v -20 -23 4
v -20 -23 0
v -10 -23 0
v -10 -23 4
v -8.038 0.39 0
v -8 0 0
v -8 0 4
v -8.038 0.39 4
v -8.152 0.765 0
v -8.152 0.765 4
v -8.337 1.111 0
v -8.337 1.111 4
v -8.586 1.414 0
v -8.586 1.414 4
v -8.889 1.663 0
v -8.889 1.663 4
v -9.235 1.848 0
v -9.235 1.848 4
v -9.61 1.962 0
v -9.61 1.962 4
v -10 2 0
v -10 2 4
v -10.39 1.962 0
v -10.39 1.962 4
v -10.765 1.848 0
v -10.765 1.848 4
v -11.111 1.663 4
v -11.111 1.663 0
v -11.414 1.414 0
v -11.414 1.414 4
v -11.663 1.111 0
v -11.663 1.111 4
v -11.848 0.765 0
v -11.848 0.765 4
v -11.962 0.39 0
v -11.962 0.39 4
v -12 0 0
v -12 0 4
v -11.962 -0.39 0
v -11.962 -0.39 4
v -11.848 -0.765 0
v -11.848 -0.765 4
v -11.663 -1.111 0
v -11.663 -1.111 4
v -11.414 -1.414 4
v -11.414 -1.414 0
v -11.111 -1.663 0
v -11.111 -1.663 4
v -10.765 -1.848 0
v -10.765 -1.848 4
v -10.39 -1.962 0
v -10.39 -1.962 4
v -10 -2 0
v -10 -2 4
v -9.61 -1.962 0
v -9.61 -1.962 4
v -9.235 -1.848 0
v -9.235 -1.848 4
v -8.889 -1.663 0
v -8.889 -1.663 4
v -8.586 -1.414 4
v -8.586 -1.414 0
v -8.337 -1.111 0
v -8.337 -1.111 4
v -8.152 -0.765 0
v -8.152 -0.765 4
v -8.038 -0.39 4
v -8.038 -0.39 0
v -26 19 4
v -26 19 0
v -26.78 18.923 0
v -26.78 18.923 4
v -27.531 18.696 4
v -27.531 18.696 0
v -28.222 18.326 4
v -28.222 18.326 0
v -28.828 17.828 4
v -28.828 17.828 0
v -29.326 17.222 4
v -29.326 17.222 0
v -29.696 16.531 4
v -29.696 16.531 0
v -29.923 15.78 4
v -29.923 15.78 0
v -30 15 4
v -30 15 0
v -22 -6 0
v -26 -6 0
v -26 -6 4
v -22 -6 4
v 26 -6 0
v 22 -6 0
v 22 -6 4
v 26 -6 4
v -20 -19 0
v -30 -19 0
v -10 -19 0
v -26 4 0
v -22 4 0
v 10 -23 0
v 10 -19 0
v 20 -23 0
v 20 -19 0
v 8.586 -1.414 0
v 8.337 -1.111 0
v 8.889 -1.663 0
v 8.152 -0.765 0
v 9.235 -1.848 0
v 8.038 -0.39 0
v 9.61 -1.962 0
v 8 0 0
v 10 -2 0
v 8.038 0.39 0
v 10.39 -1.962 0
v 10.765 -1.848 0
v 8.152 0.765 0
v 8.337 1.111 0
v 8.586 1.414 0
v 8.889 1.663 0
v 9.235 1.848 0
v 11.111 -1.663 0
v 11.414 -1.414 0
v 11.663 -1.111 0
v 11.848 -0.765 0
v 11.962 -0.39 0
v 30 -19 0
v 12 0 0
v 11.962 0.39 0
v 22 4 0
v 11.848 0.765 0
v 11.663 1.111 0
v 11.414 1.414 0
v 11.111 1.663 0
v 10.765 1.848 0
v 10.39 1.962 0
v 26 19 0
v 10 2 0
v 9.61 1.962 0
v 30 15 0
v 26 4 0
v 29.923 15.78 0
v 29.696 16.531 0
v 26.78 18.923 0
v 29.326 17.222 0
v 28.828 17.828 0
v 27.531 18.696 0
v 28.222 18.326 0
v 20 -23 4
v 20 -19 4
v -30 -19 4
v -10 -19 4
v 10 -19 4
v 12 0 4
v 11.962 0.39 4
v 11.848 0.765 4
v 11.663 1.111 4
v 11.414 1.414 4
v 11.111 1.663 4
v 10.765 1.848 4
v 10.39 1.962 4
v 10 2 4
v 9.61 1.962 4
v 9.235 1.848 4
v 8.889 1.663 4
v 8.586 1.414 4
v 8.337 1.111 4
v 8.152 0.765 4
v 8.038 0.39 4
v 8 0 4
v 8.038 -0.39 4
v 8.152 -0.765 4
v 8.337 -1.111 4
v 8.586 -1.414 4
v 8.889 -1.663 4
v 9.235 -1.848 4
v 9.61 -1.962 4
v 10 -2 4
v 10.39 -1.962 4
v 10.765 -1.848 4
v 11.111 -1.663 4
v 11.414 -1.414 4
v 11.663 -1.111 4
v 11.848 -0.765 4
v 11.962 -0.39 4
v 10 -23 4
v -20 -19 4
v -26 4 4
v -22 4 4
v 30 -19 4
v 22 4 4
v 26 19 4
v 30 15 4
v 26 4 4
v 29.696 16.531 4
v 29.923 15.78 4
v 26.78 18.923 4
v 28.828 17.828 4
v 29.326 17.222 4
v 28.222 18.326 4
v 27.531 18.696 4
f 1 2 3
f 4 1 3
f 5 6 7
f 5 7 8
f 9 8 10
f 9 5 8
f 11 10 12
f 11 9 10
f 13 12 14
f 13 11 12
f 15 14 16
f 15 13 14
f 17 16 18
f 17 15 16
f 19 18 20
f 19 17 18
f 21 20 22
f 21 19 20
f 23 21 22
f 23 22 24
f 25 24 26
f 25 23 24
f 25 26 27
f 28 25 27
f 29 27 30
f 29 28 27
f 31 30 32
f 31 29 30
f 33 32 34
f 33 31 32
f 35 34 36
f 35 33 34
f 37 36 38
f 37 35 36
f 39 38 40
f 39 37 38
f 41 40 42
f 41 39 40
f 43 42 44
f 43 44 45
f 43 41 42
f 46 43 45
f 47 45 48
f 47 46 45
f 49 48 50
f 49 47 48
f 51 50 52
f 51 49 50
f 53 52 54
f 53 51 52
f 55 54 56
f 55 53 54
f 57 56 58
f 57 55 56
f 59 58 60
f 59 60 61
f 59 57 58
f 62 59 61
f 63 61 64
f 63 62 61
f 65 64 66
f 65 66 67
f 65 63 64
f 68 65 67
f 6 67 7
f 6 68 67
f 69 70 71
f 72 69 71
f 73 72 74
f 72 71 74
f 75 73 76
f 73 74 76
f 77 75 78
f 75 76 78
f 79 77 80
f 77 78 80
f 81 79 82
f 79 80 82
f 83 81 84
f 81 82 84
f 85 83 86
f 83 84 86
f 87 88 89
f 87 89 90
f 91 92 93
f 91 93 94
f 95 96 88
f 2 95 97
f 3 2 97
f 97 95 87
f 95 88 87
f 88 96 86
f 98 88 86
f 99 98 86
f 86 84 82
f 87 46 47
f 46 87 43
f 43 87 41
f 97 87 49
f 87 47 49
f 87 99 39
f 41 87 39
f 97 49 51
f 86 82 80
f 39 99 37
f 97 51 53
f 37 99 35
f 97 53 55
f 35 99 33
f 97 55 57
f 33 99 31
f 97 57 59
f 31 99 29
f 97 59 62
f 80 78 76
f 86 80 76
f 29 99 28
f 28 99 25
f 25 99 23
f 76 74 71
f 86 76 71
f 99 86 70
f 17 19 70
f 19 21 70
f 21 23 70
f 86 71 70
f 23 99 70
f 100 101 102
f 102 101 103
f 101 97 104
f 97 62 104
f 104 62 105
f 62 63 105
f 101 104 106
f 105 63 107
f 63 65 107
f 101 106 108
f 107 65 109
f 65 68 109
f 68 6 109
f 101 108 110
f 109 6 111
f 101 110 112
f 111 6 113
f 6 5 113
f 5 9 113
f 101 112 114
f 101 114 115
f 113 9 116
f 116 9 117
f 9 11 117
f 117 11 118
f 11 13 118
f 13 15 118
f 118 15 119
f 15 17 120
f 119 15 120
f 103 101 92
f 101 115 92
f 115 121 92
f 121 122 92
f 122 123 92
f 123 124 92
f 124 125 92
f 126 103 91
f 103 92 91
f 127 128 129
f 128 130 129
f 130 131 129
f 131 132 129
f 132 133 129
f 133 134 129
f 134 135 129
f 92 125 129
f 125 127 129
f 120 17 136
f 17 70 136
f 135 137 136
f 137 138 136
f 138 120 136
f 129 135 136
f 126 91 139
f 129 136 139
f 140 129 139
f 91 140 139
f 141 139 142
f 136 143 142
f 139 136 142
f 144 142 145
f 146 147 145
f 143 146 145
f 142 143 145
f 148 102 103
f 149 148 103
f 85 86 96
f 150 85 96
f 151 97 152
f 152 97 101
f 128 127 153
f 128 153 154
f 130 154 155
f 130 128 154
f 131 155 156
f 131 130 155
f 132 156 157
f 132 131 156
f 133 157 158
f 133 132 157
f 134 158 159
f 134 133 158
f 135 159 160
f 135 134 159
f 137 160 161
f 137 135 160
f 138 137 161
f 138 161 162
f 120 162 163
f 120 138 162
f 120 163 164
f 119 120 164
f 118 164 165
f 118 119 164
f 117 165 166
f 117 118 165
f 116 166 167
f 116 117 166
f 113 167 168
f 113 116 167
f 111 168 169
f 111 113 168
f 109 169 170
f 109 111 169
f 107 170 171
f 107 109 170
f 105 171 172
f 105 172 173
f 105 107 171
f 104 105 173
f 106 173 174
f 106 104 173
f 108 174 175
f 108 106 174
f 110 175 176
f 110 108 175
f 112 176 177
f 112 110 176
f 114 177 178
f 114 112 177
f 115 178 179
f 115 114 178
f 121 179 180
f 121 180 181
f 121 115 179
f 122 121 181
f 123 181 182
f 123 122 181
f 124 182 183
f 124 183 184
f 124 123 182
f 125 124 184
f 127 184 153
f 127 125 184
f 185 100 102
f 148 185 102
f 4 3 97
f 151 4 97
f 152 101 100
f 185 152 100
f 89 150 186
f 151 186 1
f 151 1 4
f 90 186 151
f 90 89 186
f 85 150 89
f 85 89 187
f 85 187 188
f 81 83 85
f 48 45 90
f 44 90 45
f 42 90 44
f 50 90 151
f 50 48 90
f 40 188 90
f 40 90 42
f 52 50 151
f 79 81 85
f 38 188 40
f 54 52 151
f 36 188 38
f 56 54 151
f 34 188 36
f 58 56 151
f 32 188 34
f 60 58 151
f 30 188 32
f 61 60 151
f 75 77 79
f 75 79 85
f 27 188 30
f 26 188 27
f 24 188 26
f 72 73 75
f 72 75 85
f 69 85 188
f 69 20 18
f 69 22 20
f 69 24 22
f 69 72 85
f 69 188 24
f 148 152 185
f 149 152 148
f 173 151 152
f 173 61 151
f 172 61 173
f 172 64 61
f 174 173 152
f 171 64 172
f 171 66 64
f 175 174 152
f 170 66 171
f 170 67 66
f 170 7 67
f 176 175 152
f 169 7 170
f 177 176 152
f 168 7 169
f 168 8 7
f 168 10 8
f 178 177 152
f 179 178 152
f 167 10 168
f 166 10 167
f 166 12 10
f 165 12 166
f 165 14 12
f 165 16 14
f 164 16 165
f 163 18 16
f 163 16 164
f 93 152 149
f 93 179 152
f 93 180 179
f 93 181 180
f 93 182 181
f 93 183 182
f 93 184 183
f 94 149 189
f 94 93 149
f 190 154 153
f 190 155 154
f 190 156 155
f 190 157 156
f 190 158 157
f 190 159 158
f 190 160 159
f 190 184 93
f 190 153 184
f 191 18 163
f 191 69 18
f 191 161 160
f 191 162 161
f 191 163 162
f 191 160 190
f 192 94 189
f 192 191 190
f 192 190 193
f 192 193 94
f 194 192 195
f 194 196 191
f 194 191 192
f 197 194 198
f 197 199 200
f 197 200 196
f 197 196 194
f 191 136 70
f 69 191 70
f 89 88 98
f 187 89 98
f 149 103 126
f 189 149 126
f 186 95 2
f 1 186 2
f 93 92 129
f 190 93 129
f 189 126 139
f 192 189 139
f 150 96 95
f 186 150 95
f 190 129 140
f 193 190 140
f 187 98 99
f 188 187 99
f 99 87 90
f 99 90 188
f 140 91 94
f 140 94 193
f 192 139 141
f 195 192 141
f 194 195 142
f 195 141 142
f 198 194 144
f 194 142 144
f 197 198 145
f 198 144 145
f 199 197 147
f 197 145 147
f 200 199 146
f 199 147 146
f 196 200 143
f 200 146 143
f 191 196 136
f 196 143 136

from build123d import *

# Parameters (mm, degrees)
SKETCH1_R           = 2
SKETCH1_W           = 4
SKETCH1_H           = 10
BOSS_EXTRUDE1_DEPTH = 4


with BuildPart() as part:
    # Sketch1 → Boss-Extrude1 (new body)
    with BuildSketch(Plane.XY):
        with BuildLine():
            Line((-30, -19), (-20, -19))
            Line((-20, -19), (-20, -23))
            Line((-20, -23), (-10, -23))
            Line((-10, -23), (-10, -19))
            Line((-10, -19), (10, -19))
            Line((10, -19), (10, -23))
            Line((10, -23), (20, -23))
            Line((20, -23), (20, -19))
            Line((20, -19), (30, -19))
            Line((30, -19), (30, 15))
            ThreePointArc((30, 15), (28.828427125, 17.828427125), (26, 19))
            Line((26, 19), (-26, 19))
            ThreePointArc((-26, 19), (-28.828427125, 17.828427125), (-30, 15))
            Line((-30, 15), (-30, -19))
        make_face()
        with Locations((-10, 0)):
            Circle(SKETCH1_R, mode=Mode.SUBTRACT)
        with Locations((10, 0)):
            Circle(SKETCH1_R, mode=Mode.SUBTRACT)
        with Locations((-24, -1)):
            Rectangle(SKETCH1_W, SKETCH1_H, mode=Mode.SUBTRACT)
        with Locations((24, -1)):
            Rectangle(SKETCH1_W, SKETCH1_H, mode=Mode.SUBTRACT)
    extrude(amount=BOSS_EXTRUDE1_DEPTH)


solid = part.part
